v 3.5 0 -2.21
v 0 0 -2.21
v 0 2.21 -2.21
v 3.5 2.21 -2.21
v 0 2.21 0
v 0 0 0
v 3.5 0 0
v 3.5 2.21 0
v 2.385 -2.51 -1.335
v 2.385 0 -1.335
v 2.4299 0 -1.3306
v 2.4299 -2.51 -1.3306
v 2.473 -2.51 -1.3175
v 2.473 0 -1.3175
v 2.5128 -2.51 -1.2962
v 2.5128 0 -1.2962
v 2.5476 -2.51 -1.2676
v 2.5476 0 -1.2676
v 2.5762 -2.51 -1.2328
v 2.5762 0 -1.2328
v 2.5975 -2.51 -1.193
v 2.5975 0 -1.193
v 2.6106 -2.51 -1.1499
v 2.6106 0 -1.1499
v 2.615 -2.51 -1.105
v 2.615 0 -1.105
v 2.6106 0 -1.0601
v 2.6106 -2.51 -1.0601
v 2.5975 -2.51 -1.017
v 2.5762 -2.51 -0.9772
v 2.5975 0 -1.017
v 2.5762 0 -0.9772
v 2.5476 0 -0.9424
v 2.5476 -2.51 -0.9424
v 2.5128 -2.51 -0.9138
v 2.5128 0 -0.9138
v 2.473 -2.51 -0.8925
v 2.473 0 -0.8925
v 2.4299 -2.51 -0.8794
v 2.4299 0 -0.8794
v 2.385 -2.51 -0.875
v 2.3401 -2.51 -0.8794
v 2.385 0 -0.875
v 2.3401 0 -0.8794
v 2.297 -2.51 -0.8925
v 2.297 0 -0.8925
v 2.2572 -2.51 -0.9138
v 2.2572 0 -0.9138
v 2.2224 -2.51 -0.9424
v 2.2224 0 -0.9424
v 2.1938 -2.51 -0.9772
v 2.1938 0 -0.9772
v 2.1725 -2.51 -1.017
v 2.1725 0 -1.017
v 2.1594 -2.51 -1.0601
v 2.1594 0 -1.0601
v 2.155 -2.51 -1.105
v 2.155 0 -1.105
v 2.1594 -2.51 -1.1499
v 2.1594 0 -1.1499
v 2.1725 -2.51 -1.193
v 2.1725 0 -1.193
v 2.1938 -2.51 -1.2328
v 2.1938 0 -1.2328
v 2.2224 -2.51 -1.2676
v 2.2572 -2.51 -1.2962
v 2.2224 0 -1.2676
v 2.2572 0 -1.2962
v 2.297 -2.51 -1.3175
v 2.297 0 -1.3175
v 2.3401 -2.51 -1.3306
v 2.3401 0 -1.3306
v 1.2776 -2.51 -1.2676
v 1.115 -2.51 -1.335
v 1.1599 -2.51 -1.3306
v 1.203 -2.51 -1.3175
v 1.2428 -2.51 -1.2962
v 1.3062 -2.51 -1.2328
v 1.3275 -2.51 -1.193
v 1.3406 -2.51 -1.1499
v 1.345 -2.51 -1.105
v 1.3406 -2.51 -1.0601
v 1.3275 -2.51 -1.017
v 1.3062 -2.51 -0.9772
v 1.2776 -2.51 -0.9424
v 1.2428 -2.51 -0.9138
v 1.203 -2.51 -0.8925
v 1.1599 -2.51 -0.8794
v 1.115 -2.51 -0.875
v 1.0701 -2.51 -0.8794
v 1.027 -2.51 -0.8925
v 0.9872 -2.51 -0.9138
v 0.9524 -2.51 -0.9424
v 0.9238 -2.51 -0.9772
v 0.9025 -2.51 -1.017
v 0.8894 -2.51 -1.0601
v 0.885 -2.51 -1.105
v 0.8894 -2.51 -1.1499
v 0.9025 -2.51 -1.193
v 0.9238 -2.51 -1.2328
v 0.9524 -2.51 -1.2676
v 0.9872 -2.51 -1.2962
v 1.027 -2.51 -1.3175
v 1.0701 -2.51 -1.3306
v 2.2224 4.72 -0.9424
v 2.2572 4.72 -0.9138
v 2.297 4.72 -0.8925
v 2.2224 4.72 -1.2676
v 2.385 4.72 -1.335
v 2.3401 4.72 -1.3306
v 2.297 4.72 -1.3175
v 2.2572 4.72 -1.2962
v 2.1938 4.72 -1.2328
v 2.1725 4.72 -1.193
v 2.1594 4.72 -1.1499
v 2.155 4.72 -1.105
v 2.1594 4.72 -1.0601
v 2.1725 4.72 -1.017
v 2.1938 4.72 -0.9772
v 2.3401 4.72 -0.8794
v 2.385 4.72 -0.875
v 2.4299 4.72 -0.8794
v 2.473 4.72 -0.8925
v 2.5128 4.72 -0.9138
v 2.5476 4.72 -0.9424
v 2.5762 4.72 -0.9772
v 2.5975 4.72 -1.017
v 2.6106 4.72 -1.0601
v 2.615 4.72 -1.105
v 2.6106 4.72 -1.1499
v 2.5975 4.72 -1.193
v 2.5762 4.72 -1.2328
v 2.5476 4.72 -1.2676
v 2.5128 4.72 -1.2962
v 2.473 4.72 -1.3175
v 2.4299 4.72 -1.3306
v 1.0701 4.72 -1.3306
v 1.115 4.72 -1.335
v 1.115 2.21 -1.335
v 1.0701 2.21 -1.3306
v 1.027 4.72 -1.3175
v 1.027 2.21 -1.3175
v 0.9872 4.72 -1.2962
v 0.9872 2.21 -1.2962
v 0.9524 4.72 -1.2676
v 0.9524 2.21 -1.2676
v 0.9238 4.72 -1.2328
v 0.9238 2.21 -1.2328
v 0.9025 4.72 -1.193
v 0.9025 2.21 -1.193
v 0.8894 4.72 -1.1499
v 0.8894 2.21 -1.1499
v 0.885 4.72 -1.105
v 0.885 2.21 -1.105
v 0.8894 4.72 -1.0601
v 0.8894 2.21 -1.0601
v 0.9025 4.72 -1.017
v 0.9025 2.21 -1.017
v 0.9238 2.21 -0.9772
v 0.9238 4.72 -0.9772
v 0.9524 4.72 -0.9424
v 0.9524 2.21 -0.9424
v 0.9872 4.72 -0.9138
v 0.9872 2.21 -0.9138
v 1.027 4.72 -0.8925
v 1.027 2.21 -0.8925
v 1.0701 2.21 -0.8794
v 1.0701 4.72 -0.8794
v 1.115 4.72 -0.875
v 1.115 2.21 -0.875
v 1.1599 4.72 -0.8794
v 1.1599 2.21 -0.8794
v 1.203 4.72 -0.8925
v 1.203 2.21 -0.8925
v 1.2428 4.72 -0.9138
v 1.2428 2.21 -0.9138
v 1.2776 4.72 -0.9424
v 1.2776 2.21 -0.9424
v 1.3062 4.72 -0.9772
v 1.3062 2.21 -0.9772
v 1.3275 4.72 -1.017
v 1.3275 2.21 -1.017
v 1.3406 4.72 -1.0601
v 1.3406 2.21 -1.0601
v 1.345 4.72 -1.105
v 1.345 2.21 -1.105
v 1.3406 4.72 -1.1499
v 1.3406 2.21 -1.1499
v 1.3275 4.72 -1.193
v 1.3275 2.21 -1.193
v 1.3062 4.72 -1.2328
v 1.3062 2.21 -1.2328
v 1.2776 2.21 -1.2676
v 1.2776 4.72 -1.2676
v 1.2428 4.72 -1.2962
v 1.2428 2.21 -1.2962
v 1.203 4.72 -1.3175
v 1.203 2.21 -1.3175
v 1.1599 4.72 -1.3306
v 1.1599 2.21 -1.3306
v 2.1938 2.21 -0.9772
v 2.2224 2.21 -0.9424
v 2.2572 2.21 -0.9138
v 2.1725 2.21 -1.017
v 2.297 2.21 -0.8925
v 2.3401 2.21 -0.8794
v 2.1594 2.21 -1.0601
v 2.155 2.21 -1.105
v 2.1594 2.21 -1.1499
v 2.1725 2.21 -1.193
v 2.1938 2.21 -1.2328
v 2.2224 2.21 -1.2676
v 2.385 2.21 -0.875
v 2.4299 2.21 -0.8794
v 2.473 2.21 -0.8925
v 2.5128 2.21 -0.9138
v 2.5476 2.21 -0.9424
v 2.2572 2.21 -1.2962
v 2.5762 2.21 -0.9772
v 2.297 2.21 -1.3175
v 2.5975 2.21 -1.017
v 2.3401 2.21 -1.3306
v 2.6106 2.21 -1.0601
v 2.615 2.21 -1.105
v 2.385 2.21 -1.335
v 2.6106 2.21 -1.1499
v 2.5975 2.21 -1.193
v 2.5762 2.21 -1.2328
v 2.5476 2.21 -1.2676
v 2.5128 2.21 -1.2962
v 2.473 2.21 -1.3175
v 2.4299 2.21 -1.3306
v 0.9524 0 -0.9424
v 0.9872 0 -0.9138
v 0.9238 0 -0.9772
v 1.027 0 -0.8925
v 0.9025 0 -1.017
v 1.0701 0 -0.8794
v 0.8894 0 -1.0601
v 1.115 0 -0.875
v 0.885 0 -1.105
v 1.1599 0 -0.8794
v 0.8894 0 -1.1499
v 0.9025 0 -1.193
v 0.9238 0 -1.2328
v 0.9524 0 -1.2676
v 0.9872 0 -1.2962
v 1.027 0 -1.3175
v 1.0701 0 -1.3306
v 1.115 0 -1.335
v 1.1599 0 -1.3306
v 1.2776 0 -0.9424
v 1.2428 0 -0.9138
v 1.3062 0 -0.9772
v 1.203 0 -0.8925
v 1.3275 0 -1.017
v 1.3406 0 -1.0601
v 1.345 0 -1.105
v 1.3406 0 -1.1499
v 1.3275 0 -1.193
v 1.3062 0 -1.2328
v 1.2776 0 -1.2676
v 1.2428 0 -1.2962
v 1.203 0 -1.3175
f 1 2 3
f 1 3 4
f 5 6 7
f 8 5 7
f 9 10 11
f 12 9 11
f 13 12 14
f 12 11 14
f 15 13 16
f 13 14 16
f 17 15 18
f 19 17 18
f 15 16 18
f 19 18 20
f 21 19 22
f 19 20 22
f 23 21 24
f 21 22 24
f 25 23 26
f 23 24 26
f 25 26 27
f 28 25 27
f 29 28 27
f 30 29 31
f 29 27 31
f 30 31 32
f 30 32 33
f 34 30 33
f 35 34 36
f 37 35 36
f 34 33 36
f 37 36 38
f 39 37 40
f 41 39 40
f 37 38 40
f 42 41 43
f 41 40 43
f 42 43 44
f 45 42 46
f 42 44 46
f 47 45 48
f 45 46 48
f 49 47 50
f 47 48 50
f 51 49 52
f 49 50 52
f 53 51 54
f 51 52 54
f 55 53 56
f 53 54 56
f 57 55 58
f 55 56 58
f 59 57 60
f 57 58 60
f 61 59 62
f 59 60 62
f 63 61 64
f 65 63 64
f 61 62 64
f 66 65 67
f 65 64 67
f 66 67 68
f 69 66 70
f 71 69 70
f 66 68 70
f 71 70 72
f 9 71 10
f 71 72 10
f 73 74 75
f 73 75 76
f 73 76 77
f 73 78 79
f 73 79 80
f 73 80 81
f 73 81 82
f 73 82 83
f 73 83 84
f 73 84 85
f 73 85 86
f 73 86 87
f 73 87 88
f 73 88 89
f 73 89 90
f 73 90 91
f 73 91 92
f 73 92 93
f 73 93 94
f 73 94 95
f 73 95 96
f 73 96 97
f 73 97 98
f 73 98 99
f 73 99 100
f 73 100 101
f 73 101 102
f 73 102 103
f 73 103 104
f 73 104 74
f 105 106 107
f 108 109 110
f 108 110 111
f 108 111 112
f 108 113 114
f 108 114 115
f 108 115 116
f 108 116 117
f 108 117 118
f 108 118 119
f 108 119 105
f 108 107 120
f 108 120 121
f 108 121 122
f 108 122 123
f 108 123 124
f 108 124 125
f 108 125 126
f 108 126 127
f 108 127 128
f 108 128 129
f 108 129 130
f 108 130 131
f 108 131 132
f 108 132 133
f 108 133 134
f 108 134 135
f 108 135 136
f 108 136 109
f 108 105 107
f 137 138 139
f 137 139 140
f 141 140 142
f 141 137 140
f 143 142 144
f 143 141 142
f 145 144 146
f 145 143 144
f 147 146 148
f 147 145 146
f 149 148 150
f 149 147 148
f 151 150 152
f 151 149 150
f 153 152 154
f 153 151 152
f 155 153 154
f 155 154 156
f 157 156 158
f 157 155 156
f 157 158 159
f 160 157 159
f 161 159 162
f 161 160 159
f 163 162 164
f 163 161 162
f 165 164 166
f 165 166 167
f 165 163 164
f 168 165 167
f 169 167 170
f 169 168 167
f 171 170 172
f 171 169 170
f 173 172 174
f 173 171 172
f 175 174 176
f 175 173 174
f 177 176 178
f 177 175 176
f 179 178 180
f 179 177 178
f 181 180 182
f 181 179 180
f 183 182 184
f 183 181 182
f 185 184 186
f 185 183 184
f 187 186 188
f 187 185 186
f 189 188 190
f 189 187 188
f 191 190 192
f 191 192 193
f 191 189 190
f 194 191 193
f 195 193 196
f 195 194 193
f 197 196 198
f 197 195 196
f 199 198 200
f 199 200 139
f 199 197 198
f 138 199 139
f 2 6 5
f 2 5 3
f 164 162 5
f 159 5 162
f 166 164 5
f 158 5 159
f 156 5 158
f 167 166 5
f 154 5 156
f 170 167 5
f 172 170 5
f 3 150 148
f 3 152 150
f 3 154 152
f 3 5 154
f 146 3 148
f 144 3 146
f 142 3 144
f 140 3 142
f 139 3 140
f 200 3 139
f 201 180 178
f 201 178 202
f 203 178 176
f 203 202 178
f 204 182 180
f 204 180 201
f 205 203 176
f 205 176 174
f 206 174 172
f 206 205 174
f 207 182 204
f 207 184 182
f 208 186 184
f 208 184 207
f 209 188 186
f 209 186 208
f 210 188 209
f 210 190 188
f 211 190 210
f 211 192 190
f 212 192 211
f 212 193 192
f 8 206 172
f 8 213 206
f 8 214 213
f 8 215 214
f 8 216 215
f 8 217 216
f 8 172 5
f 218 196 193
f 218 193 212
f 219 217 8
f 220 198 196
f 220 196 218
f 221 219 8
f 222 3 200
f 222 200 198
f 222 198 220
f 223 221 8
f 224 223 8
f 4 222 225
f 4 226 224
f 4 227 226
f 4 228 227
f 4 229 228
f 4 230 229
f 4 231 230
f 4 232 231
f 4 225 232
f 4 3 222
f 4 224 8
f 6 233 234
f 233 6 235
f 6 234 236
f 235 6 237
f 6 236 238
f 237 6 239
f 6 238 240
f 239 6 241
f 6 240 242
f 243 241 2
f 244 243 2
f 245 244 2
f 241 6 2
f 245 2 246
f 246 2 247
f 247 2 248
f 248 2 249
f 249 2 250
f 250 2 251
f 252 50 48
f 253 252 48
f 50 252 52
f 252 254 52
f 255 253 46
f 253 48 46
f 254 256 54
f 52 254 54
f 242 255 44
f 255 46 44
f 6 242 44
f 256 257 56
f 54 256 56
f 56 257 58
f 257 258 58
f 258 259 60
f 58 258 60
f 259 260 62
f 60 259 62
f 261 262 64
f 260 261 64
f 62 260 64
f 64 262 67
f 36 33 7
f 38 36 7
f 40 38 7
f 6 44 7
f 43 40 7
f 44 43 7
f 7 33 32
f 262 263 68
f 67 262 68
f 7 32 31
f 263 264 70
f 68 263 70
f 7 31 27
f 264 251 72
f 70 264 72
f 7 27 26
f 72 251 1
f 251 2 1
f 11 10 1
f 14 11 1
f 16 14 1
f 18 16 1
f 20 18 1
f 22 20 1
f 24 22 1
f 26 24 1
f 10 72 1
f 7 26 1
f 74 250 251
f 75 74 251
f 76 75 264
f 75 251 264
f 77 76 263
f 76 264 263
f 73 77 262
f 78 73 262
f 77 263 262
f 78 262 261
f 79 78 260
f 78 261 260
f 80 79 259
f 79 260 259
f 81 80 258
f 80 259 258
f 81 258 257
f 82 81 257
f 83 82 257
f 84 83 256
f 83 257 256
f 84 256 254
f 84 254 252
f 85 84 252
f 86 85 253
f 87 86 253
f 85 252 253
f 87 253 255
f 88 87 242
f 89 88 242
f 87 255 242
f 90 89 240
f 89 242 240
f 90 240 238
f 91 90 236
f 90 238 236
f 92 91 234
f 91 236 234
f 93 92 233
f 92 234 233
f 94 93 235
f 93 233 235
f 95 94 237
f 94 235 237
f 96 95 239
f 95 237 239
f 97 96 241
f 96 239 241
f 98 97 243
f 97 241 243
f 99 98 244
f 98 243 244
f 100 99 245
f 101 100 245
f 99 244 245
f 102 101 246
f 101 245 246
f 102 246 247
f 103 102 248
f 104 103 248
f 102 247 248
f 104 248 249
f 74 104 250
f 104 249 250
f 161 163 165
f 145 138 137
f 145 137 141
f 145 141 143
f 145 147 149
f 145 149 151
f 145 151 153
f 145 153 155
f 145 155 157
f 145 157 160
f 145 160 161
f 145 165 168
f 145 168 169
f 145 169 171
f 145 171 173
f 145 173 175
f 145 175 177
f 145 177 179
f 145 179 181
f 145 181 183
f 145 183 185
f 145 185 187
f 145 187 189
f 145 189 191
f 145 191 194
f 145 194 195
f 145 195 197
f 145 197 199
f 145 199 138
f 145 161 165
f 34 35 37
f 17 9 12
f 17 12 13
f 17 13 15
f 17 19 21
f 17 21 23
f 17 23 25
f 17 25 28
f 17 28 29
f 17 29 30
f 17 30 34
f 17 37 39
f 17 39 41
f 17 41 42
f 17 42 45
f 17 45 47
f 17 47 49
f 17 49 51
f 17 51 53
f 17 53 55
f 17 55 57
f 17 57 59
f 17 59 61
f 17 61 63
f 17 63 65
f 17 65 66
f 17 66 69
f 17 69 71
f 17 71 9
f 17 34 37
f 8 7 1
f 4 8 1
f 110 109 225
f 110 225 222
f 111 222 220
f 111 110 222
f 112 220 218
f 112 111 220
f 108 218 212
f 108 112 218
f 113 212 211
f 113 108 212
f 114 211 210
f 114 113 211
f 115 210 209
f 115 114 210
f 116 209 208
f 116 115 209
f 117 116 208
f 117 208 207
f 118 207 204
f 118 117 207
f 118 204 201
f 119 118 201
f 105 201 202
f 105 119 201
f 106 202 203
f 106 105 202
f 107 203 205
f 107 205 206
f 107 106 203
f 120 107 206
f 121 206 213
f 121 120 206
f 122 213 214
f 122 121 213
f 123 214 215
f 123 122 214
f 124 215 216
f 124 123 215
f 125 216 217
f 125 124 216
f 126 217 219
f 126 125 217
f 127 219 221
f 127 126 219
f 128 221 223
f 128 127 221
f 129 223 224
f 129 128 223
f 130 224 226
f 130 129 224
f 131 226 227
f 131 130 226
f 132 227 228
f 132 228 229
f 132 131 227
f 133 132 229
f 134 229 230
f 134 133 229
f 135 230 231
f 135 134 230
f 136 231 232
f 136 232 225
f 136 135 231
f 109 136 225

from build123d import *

# Parameters (mm, degrees)
SKETCH1_W           = 3.5
SKETCH1_H           = 2.21
BOSS_EXTRUDE1_DEPTH = 2.21
SKETCH2_R           = 0.23
BOSS_EXTRUDE2_DEPTH = 2.51
BOSS_EXTRUDE3_START = 2.51
SKETCH3_R           = 0.23
BOSS_EXTRUDE3_DEPTH = 2.51


with BuildPart() as part:
    # Sketch1 → Boss-Extrude1 (new body)
    with BuildSketch(Plane(origin=(0, 0, 0), x_dir=(1, 0, 0), z_dir=(0, 1, 0))):
        with Locations((1.75, 1.105)):
            Rectangle(SKETCH1_W, SKETCH1_H)
    extrude(amount=BOSS_EXTRUDE1_DEPTH)

    # Sketch2 → Boss-Extrude2 (add)
    with BuildSketch(Plane.XZ):
        with Locations(Location((1.115, -1.105, 0), (0, 0, 270))):
            Circle(SKETCH2_R)
        with Locations(Location((2.385, -1.105, 0), (0, 0, 270))):
            Circle(SKETCH2_R)
    extrude(amount=BOSS_EXTRUDE2_DEPTH)

    # Sketch3 → Boss-Extrude3 (add)
    with BuildSketch(Plane(origin=(0, 2.21, 0), x_dir=(1, 0, 0), z_dir=(0, 1, 0)).offset(BOSS_EXTRUDE3_START)):
        with Locations(Location((2.385, 1.105, 0), (0, 0, 90))):
            Circle(SKETCH3_R)
        with Locations(Location((1.115, 1.105, 0), (0, 0, 90))):
            Circle(SKETCH3_R)
    extrude(amount=-BOSS_EXTRUDE3_DEPTH)


solid = part.part
